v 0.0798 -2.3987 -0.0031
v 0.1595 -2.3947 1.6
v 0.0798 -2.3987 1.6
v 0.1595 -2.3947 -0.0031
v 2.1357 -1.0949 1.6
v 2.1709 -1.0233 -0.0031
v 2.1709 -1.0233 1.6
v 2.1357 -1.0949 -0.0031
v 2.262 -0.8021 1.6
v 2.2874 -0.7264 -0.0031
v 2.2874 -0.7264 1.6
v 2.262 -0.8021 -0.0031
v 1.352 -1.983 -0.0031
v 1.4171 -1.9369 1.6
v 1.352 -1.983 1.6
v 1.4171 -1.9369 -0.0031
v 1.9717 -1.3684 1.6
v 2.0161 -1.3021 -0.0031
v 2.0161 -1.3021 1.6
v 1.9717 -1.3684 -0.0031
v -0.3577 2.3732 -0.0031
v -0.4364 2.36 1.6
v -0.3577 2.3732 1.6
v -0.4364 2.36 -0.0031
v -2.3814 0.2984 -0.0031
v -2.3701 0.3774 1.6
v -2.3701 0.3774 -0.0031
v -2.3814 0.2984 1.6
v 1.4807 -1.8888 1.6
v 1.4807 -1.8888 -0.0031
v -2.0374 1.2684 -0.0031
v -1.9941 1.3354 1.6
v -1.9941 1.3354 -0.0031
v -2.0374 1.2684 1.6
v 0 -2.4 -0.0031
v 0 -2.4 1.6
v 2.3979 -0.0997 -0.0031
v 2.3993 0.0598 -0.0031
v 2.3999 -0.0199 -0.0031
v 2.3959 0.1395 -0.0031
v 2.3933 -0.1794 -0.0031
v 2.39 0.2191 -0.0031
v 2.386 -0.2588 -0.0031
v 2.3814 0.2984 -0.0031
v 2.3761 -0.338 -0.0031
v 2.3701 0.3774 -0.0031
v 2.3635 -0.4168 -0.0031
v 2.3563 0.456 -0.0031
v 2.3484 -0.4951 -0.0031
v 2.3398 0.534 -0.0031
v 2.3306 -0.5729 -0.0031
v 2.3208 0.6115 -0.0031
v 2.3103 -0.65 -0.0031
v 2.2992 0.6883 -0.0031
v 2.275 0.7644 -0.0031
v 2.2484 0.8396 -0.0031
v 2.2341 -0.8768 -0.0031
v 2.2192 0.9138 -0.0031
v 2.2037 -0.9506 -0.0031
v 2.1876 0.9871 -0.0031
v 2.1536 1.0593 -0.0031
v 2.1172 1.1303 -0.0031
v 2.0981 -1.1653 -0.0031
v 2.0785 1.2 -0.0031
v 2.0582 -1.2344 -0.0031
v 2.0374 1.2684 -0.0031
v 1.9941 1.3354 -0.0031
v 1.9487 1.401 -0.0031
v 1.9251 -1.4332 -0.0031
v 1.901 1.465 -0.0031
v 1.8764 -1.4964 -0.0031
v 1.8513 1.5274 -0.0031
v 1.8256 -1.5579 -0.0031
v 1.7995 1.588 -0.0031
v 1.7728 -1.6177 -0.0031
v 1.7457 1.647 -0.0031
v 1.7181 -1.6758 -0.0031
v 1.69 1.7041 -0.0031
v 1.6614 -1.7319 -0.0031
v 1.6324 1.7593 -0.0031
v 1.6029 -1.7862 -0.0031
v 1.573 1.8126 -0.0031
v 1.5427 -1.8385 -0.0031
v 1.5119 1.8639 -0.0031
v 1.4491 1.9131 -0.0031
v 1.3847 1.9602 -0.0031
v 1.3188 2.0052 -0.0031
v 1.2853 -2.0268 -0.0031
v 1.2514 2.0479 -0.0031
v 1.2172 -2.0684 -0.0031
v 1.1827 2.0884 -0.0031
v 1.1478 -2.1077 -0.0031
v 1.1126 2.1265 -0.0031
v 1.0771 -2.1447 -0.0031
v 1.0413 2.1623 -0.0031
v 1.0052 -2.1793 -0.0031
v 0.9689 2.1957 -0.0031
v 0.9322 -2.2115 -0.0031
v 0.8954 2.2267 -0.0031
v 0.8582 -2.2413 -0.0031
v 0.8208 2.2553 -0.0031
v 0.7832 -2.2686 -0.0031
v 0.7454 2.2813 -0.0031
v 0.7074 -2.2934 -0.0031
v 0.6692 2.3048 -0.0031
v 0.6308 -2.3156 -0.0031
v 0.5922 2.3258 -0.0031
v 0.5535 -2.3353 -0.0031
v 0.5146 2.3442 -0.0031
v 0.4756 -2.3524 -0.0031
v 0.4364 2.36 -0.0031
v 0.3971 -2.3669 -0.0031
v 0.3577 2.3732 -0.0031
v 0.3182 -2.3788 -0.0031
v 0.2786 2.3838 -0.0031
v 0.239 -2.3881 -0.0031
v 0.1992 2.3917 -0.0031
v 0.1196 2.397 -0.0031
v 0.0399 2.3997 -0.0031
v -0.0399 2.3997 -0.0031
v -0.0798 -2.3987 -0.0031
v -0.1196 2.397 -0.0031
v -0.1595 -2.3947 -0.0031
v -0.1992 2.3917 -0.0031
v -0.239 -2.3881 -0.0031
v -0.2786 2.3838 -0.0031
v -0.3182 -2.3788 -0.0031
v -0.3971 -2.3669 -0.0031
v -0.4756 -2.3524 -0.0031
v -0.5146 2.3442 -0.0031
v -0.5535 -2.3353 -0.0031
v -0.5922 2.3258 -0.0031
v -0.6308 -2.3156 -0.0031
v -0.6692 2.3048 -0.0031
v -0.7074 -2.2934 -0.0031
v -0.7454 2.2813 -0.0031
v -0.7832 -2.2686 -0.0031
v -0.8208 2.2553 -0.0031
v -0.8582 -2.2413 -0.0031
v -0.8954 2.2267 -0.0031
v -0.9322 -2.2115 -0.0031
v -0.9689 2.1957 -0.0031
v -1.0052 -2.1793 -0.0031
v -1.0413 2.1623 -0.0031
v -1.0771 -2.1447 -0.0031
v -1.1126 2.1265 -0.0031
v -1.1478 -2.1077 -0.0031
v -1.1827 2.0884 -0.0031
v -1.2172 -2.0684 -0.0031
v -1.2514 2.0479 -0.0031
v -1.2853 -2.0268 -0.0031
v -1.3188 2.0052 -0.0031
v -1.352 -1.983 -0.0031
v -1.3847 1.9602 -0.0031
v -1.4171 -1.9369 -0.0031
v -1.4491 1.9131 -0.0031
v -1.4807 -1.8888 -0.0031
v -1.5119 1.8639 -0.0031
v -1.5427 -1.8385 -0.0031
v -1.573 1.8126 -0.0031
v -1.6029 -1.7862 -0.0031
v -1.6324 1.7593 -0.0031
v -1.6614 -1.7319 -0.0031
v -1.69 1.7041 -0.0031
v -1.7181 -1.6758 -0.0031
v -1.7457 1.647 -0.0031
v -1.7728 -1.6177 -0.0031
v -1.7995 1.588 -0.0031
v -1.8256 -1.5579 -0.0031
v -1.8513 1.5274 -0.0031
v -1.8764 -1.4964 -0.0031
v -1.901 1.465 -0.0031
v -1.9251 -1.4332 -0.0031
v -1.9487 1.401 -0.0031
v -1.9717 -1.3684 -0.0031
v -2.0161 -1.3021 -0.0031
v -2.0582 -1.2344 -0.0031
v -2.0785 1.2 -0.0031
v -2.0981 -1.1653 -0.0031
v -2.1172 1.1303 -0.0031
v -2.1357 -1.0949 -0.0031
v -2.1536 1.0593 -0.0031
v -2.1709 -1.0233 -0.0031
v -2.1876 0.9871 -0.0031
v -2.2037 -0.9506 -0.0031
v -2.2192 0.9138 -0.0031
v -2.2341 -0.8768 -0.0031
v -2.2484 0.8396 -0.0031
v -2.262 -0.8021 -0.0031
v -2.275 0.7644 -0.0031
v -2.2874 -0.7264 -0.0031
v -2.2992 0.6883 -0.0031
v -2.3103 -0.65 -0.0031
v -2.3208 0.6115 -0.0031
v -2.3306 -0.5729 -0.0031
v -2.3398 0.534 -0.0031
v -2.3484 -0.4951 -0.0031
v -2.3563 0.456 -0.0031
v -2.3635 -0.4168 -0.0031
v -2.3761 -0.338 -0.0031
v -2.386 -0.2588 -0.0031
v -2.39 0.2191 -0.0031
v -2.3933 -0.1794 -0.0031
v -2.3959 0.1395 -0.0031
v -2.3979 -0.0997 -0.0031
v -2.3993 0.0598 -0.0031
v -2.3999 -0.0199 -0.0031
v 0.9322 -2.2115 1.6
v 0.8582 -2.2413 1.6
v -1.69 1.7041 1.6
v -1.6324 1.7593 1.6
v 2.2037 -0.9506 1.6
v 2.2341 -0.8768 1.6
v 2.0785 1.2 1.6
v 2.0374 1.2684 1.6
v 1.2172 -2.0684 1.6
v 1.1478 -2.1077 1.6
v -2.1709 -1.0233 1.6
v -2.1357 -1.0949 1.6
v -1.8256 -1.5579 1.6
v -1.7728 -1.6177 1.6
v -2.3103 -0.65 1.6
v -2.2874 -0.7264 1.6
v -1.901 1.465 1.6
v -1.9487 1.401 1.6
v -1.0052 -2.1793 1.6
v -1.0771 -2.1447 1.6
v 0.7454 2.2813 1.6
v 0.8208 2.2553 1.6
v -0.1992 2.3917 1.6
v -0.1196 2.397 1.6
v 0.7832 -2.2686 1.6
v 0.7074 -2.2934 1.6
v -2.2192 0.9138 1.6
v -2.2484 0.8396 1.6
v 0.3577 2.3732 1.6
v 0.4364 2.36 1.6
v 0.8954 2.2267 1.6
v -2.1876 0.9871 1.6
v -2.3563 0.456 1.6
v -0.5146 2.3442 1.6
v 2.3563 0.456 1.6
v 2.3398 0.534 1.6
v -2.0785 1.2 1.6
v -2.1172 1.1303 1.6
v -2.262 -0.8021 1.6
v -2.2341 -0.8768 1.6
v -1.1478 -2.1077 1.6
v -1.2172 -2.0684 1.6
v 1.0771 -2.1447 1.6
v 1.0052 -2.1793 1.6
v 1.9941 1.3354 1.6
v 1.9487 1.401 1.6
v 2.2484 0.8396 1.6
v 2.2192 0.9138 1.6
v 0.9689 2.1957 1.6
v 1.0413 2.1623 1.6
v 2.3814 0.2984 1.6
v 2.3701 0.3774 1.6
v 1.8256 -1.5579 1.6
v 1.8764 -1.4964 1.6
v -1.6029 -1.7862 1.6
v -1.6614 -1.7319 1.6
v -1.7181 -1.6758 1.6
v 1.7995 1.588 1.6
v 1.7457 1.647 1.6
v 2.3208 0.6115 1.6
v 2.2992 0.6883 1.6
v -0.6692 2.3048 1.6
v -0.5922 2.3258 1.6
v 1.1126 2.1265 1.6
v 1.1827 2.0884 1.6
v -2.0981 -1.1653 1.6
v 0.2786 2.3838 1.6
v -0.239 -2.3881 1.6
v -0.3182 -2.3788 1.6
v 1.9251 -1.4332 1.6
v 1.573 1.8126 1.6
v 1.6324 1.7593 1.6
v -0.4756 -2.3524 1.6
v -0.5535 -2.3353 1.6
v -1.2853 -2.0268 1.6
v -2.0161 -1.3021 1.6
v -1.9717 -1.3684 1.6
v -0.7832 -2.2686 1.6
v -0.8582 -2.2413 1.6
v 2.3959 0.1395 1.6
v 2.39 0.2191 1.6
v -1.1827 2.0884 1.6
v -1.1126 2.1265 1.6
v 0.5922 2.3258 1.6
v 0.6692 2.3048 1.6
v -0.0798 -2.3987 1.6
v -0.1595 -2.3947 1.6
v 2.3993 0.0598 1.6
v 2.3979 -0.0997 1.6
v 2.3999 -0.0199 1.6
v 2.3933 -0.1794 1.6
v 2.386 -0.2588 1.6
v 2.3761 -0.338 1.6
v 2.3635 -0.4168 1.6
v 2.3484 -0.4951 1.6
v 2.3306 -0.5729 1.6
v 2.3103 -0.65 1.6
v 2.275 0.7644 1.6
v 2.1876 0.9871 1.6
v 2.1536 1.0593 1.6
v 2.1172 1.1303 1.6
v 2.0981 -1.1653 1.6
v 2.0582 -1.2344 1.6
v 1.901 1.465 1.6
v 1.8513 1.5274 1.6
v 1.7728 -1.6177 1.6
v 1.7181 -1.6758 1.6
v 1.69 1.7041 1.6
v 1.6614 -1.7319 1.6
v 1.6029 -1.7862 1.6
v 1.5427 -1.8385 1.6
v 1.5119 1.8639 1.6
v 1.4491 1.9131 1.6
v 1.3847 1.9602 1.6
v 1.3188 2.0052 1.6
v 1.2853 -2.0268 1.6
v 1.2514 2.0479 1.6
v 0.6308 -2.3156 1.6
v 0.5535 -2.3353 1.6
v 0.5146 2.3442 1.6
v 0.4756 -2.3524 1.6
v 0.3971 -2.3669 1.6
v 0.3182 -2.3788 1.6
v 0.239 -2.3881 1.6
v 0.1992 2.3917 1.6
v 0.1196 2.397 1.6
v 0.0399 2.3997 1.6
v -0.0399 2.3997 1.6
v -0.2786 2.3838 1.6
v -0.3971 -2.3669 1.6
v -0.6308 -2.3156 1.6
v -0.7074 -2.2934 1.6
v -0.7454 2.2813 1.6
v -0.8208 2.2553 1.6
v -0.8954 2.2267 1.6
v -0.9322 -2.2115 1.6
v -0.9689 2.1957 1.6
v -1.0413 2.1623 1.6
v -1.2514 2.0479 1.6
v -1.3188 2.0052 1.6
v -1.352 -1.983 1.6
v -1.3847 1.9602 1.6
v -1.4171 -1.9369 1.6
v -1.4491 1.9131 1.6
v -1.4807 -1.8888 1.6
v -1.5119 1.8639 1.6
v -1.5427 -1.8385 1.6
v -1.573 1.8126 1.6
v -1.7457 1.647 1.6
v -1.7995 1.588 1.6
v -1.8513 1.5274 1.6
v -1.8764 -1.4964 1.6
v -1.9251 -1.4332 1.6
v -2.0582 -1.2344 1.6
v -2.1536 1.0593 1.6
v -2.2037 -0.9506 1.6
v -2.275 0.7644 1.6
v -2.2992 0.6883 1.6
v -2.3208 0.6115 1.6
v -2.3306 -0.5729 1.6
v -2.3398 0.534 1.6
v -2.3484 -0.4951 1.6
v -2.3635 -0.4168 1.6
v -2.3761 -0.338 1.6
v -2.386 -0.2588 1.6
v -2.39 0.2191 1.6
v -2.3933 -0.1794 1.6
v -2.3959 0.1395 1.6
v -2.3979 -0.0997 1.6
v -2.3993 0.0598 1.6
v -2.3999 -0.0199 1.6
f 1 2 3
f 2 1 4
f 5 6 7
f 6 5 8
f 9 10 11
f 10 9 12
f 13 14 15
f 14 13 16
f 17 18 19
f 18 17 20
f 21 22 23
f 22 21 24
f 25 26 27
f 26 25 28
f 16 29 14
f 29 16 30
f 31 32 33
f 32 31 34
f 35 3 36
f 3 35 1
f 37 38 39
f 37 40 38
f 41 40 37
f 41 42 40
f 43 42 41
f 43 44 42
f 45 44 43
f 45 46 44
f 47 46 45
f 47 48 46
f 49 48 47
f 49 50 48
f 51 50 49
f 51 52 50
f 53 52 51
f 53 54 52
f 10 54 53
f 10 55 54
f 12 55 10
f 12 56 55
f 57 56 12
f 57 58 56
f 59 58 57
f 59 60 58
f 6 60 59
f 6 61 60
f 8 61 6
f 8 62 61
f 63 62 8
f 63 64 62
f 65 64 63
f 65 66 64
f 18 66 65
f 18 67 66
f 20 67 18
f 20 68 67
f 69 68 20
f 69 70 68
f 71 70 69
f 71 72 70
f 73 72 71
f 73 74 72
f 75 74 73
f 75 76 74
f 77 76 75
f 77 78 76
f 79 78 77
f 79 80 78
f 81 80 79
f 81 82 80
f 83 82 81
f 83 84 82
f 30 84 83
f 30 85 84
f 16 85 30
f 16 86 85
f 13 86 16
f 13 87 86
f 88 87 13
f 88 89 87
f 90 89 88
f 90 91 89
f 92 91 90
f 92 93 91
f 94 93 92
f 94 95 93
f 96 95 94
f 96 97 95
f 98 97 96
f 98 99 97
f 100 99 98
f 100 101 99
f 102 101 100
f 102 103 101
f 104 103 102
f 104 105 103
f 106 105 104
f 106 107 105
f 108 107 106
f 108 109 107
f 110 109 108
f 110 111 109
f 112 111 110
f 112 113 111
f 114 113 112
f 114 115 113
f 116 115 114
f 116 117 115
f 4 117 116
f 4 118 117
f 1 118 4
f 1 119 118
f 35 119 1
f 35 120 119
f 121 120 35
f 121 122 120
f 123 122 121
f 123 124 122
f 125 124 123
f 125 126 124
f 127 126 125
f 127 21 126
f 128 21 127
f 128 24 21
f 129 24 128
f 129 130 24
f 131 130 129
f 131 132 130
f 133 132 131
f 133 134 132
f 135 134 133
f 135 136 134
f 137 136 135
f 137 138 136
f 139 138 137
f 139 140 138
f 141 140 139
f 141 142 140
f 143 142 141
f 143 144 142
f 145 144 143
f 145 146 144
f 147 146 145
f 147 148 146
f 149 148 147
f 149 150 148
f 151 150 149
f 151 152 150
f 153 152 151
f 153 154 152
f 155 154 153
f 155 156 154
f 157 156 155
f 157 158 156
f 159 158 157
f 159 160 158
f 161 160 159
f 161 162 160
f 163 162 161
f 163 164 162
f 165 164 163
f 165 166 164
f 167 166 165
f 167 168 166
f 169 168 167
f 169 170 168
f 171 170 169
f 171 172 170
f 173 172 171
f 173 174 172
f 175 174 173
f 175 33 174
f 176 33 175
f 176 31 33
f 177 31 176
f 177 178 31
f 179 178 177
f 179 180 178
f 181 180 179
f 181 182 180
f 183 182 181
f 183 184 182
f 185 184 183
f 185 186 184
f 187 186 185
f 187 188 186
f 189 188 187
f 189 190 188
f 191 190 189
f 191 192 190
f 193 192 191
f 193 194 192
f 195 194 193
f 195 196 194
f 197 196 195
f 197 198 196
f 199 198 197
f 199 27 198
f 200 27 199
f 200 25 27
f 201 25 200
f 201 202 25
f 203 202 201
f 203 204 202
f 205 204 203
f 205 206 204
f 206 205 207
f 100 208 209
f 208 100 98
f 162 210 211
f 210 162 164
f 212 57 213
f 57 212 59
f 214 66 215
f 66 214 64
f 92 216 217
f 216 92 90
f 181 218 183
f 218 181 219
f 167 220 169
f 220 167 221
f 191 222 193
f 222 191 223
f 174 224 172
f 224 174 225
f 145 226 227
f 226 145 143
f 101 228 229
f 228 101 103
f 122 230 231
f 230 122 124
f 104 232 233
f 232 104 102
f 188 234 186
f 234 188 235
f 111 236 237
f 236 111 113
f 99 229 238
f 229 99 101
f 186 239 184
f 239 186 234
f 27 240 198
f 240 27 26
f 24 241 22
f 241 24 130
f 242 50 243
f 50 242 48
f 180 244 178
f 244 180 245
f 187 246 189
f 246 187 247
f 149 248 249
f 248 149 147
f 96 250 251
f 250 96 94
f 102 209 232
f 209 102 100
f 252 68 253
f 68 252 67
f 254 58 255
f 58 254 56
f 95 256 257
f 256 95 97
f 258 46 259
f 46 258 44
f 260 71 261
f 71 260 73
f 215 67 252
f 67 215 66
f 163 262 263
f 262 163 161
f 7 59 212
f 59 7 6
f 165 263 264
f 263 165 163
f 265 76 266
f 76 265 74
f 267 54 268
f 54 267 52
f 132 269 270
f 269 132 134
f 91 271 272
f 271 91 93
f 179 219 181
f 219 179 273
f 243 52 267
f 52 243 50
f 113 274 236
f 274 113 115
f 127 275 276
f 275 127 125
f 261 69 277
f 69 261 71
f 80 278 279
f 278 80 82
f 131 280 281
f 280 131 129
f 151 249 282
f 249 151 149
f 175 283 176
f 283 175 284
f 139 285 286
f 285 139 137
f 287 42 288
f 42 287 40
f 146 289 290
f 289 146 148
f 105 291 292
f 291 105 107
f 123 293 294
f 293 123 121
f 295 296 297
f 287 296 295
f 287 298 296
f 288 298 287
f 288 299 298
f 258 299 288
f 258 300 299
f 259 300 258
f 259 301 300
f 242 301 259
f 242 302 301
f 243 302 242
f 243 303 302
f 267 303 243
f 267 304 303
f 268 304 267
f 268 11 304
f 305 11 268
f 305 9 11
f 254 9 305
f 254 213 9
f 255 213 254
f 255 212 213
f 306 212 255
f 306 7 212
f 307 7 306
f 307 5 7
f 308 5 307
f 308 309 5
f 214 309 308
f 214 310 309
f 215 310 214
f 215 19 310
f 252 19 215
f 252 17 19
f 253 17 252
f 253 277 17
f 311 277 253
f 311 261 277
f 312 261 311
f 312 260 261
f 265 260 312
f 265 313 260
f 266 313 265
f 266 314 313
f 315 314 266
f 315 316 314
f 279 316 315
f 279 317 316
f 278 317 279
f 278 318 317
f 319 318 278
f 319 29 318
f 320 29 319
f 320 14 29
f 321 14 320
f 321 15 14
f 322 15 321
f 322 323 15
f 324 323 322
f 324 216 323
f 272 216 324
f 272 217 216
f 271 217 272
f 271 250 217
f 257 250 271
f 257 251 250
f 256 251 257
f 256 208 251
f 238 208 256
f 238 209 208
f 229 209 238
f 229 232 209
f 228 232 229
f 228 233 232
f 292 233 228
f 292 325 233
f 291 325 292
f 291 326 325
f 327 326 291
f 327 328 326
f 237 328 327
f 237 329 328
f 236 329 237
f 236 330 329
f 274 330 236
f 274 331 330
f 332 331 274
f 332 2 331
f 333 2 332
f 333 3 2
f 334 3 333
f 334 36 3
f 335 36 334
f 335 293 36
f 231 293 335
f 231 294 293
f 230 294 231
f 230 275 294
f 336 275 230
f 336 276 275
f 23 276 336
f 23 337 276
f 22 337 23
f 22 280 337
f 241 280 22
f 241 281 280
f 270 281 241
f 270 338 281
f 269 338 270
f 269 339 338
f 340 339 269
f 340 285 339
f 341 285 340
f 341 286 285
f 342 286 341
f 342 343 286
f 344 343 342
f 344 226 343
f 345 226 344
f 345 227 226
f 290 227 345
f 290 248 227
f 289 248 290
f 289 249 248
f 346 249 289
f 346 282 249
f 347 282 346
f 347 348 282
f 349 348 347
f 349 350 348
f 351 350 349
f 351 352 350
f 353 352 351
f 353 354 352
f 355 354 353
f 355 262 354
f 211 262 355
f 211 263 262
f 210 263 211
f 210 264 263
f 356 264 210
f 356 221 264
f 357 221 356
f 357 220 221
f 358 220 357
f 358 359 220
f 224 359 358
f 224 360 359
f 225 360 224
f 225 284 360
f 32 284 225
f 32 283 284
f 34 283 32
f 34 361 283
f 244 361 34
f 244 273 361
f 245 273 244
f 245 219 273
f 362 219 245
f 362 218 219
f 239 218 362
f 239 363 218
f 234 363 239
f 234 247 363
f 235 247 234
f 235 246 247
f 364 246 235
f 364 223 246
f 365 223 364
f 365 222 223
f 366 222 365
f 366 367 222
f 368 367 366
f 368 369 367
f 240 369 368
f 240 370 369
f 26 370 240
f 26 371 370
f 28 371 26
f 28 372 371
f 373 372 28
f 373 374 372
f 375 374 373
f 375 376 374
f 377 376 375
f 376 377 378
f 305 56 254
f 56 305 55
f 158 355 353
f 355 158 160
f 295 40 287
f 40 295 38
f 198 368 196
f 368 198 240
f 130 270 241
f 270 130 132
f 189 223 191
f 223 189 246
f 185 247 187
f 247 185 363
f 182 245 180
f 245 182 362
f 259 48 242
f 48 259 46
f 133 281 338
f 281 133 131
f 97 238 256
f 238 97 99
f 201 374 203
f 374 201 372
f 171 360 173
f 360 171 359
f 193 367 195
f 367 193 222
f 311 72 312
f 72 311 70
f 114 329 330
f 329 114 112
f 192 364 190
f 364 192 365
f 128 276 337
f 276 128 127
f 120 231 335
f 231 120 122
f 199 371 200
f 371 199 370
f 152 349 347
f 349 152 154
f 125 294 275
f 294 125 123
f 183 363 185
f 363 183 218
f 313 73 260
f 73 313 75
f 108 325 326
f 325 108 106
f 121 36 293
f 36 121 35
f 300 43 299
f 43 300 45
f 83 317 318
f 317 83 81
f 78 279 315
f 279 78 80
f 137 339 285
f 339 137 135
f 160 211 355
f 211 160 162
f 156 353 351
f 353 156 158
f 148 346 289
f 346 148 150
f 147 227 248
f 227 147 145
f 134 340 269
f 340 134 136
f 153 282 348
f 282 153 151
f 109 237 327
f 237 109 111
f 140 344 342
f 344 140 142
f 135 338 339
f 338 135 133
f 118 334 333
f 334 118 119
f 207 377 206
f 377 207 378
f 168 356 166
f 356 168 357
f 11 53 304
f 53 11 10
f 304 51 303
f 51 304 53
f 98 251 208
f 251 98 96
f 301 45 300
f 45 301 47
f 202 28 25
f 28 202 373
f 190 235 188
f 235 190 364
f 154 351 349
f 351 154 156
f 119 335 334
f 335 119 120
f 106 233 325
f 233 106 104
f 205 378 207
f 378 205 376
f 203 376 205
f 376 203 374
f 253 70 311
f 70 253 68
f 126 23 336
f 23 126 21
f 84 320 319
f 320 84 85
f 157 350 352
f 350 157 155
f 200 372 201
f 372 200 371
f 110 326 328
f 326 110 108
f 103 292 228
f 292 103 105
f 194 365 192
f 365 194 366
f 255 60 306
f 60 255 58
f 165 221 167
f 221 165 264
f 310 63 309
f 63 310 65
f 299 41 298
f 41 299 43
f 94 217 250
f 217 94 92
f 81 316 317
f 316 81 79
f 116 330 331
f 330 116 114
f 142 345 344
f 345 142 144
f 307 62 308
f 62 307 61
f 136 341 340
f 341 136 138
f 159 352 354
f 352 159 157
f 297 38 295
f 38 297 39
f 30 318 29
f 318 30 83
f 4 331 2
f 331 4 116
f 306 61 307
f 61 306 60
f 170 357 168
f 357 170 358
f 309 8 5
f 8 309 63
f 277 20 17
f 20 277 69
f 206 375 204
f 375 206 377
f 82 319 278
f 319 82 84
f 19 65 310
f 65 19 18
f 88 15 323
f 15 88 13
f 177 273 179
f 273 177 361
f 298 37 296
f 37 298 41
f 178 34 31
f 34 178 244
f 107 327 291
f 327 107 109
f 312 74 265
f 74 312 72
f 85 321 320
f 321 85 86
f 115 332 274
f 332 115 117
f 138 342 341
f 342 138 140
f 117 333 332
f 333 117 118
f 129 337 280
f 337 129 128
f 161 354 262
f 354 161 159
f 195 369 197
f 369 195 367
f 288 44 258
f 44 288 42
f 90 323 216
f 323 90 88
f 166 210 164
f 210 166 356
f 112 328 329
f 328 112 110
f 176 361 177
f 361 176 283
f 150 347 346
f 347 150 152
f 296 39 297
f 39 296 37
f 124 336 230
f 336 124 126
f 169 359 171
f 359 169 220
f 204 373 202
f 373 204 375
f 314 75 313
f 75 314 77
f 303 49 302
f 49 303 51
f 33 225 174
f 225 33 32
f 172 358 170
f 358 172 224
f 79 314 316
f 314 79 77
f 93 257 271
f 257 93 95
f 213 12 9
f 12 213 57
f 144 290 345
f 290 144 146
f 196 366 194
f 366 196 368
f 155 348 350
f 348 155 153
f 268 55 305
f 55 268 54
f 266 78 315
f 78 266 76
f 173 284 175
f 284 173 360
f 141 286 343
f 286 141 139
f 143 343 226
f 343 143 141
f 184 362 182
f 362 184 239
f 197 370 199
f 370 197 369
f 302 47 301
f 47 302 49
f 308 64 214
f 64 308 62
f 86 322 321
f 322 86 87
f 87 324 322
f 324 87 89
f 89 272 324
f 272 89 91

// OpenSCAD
use <../lib.scad>
use <3040p01.scad>
$fa=1; $fs=0.2;
function ldraw_lib__81149(realsolid=false) = [
// 0 ~_Slope Brick 45  1 x  2 with 3 Buttons, 3 Red Lamps/Yellow Panel (Obsolete)
// 0 Name: 81149.dat
// 0 Author: [PTadmin]
// 0 !LDRAW_ORG Part Physical_Colour UPDATE 2019-02
// 0 !LICENSE Licensed under CC BY 2.0 and CC BY 4.0 : see CAreadme.txt
// 
// 0 BFC CERTIFY CCW
  [0,"BFC","CERTIFY"],
  [0,"BFC","CCW"],
// 
// 0 !HISTORY 1999-12-31 [PTadmin] Official Update 1999-06
// 0 !HISTORY 2007-10-12 [PTadmin] Header formatted for Contributor Agreement
// 0 !HISTORY 2008-07-01 [PTadmin] Official Update 2008-01
// 0 !HISTORY 2019-05-27 [Steffen] BFCed, obsoleted per decision not to include physical colour parts
// 0 !HISTORY 2019-09-09 [PTadmin] Official Update 2019-02
// 
// 
// 1 0 0 0 0 1 0 0 0 1 0 0 0 1 3040p01.dat
  [1,0,0,0,0,1,0,0,0,1,0,0,0,1, ldraw_lib__3040p01(realsolid)],
];
module ldraw_lib__81149(step=0, col=false, unit=2/5, alt=false, line=0.2, solid=!$preview)
    makepoly(ldraw_lib__81149(solid), step=step, col=col, unit=unit, alt=alt, line=line, solid=solid);
ldraw_lib__81149(line=0.2);
